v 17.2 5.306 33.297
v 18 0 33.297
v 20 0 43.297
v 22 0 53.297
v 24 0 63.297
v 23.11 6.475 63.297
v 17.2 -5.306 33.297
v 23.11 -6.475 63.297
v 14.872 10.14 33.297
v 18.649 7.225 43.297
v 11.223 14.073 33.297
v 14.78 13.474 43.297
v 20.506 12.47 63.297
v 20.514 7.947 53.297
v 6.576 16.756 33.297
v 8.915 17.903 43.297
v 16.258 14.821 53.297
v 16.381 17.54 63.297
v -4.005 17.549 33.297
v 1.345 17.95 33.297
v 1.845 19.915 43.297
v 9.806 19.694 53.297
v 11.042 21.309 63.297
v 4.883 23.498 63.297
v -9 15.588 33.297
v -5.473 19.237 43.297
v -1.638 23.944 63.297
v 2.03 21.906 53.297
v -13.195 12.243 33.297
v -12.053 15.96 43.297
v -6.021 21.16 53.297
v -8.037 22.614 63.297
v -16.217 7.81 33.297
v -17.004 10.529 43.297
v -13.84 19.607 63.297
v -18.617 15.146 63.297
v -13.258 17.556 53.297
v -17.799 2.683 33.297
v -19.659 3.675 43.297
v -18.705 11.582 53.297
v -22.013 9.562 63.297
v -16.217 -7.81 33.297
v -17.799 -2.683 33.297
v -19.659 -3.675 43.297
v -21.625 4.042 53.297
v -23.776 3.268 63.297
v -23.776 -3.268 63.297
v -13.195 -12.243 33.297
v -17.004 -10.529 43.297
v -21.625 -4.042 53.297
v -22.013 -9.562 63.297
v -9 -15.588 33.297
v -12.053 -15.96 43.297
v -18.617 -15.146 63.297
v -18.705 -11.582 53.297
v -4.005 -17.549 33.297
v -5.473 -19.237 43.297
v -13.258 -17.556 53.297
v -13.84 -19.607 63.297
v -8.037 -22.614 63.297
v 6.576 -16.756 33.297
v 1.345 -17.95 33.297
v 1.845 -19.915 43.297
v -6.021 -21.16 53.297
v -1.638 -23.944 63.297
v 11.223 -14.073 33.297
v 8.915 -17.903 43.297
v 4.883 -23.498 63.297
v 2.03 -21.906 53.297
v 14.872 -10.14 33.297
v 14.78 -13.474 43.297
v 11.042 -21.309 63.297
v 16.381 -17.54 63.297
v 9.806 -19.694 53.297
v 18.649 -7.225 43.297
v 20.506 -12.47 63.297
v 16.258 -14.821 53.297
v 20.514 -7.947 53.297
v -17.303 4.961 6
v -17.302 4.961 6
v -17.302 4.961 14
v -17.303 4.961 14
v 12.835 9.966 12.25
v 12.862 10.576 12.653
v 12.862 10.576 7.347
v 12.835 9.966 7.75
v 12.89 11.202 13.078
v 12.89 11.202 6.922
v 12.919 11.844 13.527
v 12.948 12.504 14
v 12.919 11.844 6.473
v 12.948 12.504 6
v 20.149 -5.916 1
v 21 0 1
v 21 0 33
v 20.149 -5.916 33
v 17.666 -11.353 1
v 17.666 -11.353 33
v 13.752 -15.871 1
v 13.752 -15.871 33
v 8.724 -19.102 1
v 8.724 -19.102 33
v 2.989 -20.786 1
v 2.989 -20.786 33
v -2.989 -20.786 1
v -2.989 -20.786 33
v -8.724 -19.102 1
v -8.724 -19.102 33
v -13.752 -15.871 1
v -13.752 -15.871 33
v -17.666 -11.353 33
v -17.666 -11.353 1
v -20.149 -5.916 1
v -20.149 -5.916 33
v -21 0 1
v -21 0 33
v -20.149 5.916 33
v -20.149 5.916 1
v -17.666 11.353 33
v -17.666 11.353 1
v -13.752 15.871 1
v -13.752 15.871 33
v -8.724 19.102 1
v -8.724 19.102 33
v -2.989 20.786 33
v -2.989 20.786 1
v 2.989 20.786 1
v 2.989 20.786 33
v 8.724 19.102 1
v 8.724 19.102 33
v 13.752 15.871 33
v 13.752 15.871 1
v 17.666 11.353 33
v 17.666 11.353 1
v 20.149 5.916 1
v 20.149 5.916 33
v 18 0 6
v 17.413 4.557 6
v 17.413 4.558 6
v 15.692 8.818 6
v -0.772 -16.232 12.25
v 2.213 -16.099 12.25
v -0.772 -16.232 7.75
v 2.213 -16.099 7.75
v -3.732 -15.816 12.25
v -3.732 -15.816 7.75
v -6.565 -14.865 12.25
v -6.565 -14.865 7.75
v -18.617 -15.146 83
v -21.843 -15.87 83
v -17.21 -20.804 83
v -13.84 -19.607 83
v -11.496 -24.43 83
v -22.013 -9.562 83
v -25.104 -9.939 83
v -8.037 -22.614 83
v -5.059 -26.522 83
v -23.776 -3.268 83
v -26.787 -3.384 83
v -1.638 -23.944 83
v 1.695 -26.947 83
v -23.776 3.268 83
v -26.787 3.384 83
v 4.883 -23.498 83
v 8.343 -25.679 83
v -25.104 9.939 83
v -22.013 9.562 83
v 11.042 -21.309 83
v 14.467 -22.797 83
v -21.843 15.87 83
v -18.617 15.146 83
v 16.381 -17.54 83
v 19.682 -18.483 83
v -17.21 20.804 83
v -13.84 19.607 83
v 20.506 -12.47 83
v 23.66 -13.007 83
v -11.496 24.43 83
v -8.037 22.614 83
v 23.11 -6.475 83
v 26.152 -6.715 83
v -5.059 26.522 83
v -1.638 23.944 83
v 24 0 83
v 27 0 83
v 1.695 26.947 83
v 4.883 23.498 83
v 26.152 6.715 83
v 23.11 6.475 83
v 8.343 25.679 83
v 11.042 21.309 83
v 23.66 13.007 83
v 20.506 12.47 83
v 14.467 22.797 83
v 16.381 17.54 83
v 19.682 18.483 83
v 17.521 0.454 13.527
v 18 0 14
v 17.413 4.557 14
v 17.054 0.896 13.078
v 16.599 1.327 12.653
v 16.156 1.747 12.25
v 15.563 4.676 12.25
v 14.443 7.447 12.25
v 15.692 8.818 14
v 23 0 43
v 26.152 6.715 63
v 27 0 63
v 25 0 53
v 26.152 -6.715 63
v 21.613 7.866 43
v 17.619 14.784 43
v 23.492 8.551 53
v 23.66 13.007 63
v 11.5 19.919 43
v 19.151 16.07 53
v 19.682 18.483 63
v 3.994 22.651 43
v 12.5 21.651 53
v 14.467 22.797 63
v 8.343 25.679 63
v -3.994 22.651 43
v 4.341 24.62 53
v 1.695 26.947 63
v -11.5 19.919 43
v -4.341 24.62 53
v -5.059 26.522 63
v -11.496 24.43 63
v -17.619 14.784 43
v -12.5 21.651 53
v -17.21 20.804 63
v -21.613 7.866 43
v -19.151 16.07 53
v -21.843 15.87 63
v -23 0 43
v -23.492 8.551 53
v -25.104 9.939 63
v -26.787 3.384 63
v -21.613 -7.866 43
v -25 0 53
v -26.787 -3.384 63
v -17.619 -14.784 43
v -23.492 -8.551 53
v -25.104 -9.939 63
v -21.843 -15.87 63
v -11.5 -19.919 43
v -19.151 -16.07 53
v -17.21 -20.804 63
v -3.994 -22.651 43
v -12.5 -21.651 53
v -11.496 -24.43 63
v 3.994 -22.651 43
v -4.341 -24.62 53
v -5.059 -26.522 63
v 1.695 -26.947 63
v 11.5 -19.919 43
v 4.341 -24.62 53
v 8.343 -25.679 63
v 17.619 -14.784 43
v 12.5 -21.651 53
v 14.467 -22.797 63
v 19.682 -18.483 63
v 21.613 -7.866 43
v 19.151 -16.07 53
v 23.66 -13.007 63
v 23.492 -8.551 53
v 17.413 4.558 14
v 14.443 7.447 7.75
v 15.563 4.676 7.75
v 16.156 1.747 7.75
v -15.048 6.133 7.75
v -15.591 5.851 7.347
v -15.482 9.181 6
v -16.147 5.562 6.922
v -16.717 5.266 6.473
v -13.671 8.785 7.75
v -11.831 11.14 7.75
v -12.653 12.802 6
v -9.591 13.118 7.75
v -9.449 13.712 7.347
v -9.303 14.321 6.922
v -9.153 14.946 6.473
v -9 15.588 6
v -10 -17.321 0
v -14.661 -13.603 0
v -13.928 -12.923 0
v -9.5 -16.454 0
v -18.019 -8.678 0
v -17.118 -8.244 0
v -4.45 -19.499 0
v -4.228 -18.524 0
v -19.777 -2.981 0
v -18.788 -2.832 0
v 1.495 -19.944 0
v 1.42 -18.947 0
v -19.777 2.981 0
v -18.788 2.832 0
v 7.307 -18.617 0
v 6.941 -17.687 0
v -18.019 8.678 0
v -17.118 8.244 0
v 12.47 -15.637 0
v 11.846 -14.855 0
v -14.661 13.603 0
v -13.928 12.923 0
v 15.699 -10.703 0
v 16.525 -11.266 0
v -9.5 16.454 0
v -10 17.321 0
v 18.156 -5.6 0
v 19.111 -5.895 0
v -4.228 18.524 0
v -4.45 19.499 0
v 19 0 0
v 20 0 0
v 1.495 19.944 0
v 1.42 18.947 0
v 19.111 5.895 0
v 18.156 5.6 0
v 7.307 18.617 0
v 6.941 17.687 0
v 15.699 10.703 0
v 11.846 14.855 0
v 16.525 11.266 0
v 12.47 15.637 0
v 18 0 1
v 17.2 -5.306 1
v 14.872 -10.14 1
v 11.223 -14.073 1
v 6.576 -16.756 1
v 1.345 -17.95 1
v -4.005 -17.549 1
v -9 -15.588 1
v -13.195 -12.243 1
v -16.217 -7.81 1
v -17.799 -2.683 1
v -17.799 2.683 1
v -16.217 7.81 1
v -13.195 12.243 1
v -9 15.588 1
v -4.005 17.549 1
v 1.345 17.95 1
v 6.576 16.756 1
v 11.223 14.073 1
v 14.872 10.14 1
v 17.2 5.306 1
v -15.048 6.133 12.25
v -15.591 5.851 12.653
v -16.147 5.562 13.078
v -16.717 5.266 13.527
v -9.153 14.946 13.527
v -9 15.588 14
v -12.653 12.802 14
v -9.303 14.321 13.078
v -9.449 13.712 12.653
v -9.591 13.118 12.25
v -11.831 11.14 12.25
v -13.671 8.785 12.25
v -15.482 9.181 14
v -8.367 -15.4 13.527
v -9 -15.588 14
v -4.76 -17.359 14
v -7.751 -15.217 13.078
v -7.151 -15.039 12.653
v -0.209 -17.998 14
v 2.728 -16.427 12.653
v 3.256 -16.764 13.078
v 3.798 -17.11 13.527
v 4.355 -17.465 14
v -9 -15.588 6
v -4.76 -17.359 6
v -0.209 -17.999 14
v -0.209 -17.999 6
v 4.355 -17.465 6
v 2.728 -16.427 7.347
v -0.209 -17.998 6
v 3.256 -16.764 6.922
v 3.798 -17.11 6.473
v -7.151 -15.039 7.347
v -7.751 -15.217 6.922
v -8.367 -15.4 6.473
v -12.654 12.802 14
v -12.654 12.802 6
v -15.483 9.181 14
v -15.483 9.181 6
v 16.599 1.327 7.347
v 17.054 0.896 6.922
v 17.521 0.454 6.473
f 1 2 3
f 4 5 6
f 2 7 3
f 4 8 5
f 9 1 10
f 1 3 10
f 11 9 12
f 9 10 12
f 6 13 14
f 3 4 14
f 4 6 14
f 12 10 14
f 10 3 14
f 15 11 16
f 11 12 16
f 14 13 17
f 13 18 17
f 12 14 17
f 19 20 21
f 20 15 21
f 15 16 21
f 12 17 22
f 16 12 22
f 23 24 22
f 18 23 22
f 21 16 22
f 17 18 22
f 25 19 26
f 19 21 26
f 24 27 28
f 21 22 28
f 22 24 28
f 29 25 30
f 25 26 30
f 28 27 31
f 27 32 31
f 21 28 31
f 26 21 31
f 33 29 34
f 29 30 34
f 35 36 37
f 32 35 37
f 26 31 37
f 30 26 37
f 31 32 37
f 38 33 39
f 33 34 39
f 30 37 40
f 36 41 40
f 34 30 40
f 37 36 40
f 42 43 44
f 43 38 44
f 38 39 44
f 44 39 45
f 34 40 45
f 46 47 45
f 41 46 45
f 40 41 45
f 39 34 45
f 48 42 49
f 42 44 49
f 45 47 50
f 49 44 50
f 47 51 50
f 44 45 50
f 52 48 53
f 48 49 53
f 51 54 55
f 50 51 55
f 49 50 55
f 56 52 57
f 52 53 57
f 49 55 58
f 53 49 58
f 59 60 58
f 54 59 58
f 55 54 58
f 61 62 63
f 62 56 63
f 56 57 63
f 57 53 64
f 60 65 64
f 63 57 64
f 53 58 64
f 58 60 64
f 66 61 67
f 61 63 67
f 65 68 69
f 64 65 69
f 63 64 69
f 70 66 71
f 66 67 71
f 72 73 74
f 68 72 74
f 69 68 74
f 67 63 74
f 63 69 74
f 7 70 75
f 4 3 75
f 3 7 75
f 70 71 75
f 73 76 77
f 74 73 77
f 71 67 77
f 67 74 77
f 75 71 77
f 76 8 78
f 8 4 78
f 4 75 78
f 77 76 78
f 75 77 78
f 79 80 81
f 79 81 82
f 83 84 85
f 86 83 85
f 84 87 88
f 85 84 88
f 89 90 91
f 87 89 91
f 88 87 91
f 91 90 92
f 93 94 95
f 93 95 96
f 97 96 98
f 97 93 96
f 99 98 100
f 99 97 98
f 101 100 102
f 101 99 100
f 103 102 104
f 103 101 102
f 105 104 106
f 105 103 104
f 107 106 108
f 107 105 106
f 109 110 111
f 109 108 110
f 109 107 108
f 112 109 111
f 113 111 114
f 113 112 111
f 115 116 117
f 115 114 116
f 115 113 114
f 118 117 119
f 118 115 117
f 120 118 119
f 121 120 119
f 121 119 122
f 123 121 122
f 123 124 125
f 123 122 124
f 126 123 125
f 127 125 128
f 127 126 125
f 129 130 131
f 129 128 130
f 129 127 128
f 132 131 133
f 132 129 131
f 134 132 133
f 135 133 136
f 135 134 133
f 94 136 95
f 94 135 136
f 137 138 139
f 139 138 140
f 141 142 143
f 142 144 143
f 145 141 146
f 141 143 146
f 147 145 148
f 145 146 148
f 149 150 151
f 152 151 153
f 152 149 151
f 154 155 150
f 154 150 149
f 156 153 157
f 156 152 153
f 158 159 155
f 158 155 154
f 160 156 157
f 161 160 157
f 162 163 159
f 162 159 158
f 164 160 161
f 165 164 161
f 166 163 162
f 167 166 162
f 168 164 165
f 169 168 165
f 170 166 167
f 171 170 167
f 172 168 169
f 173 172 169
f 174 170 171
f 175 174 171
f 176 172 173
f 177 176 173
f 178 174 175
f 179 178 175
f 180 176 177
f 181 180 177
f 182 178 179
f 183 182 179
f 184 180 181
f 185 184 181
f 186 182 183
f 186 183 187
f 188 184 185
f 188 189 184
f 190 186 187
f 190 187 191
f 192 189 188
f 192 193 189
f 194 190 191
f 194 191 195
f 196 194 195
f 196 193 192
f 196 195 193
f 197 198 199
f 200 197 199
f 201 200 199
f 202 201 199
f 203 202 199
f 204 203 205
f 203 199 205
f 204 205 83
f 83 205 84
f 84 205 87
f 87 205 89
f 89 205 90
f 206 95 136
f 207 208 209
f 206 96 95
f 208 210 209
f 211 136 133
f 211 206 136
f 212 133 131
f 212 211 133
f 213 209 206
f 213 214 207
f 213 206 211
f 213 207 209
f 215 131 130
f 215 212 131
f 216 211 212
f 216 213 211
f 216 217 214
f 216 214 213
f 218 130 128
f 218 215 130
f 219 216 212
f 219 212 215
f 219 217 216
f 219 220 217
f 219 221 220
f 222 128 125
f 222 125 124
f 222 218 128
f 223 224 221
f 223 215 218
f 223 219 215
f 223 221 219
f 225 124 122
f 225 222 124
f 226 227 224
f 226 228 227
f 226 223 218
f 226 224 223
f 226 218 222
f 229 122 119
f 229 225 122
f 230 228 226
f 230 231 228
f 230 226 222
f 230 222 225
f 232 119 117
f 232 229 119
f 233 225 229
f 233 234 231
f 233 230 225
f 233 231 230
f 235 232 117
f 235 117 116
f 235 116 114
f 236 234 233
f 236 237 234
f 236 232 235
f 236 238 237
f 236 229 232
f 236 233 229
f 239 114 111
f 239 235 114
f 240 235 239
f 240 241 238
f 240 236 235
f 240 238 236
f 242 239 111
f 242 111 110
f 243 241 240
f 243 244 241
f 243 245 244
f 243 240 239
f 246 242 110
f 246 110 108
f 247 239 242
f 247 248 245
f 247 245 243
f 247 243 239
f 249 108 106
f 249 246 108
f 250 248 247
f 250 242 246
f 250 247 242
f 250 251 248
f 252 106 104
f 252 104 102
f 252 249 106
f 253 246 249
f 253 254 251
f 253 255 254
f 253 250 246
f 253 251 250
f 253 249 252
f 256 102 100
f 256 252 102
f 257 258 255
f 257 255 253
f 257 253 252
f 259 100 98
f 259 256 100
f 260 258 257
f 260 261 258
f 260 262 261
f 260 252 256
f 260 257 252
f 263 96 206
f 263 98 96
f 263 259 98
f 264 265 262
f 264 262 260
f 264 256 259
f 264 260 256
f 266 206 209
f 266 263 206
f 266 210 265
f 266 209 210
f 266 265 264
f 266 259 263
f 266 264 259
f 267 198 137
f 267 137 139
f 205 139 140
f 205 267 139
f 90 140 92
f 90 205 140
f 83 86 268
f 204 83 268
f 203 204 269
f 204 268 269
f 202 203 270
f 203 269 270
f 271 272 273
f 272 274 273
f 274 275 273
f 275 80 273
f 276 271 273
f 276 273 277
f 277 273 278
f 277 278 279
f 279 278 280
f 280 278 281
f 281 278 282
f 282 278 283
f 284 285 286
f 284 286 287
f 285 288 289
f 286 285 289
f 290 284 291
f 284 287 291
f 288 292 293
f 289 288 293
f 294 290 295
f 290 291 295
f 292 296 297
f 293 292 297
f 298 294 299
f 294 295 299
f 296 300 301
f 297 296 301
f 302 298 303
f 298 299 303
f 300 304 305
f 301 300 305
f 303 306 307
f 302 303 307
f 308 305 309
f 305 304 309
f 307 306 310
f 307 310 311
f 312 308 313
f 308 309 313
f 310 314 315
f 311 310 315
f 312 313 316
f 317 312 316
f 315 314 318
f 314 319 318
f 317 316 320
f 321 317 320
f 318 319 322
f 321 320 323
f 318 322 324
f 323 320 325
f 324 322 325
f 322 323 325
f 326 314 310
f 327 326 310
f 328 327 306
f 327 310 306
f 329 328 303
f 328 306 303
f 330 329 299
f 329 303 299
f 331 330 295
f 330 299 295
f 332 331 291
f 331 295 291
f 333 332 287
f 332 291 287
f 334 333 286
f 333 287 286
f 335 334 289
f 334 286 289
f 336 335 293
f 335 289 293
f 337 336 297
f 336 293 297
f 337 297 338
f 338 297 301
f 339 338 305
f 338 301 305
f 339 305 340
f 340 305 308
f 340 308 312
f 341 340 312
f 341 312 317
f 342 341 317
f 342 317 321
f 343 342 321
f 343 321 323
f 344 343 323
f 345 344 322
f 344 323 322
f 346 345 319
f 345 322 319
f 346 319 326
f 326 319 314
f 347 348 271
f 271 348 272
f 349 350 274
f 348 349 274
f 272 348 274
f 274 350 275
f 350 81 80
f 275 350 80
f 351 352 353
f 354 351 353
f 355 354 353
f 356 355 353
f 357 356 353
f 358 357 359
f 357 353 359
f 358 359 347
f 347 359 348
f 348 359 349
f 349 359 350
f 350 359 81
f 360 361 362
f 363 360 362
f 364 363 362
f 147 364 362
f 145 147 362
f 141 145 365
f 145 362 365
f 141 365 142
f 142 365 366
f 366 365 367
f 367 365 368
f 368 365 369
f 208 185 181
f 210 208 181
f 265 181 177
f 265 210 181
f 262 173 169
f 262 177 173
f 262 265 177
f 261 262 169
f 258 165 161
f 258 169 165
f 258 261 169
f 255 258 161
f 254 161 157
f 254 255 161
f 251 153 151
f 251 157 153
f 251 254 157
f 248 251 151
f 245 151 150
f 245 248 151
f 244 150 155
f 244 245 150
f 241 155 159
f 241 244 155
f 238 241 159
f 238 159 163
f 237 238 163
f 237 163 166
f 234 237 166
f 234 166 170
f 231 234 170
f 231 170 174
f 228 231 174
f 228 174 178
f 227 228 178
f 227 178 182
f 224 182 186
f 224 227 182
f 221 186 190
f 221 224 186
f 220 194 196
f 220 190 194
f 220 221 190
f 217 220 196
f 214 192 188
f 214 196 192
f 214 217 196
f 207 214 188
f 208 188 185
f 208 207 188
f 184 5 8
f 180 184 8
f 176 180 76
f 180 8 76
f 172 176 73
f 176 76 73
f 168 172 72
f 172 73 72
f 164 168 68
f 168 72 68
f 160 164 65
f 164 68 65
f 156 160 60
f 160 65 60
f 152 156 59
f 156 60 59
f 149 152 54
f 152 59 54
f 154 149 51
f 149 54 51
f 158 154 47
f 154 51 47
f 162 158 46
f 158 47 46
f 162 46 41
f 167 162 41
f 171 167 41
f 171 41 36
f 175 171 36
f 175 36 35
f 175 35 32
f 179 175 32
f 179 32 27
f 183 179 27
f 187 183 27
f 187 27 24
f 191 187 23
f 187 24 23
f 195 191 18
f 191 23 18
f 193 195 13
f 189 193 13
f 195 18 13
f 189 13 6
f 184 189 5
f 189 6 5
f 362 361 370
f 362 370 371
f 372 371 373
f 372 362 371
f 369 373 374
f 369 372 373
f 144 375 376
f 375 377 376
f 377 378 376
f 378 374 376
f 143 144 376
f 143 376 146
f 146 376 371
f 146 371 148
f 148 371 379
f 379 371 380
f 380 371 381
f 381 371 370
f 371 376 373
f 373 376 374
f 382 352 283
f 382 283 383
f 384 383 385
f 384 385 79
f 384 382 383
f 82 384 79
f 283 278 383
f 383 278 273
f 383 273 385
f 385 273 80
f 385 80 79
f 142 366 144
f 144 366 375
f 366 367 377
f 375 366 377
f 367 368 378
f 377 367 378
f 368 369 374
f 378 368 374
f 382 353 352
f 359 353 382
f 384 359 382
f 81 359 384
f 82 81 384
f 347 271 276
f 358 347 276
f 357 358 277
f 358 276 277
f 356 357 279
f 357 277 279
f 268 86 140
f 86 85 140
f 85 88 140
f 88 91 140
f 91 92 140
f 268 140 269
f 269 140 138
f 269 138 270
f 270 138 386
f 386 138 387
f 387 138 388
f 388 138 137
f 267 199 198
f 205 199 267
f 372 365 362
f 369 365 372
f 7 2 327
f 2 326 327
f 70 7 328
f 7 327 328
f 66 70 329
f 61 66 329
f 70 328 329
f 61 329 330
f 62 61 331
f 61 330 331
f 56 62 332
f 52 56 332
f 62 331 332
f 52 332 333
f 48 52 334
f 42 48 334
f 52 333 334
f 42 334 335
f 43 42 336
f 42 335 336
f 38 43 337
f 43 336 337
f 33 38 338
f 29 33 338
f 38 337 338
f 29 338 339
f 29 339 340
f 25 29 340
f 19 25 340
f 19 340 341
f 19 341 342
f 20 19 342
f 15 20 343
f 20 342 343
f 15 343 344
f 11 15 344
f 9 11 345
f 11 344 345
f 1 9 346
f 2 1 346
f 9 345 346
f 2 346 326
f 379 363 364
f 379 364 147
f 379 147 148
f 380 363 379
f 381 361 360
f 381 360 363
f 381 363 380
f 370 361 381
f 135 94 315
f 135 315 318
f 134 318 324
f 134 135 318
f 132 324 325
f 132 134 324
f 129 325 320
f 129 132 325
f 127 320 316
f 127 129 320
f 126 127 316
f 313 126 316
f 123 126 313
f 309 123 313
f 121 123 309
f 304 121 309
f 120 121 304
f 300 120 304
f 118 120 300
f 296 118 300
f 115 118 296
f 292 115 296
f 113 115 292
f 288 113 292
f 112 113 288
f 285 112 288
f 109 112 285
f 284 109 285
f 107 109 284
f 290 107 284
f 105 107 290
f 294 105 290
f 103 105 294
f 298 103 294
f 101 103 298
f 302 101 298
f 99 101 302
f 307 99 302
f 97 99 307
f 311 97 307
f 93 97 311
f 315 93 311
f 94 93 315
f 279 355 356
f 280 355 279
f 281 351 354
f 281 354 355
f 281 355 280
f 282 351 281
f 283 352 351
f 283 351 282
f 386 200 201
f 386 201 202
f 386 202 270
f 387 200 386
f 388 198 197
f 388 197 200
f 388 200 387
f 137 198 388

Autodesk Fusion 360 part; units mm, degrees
sketch "adapter_side" plane through (0, 0, 0) normal (0, 0, 1) x (1, 0, 0)
  circle A0 centre (0, 0) radius 21
  dimension "d33" = 42
extrude "Extrude2" add sketch "adapter_side" along normal blind 33 makes body 1
ref_plane "WorkPlane2" through (0, 0, 63) normal (0, 0, 1) x (1, 0, 0)
sketch "bandsaw_side" plane through (0, 0, 63) normal (0, 0, 1) x (1, 0, 0)
  circle A0 centre (0, 0) radius 27
  dimension "d38" = 54
extrude "Extrude3" add sketch "bandsaw_side" along normal blind 20 separate body makes body 2
loft "Loft3" add section 1 face at (-5.9246, 2.0633, 33) section 2 face at (4.9388, -0.7444, 63) on bodies 1 2 bodies 1 2
shell "Shell1" thickness 3 removed faces 2 at (-5.9246, 2.0633, 0) at (4.9388, -0.7444, 83) on bodies 1
sketch "pins" plane through (0, 0, 0) normal (0, 1, 0) x (1, 0, 0)
  line L0 (18, 0) -> (18, -33.2971)
  line L1 (-18, -33.2971) -> (-18, 0)
  line L2 (18, -14) -> (16.25, -14)
  line L3 (16.25, -14) -> (16.25, -6)
  line L4 (16.25, -6) -> (18, -6)
  line L5 (18, -6) -> (18, -14)
  dimension "d42" = 1.75
  dimension "d43" = 8
  dimension "d44" = 6
revolve "Revolve3" add sketch "pins" angle 44 about axis through (0, 0, 1.75) along (0, 0, 1) separate body makes body 3
chamfer "Chamfer2" distance 1.75 angle 45 4 edges at (15.0667, 6.0874, 14) (16.25, 0, 10) (15.0667, 6.0874, 6) (11.6893, 11.2882, 10) on bodies 3
pattern_circular "C-Pattern2" count 3 over 360 about axis through (0, 0, 1.75) along (0, 0, 1) of bodies 3 makes body 4 at (-16.2088, 7.8279, 8.6667) makes body 5 at (-5.4959, -17.1405, 8.6667)
chamfer "Chamfer3" distance 1 angle 45 2 edges at (-19.5789, -7.5939, 0) (-16.7819, -6.5091, 0) on bodies 1
equation "d_adapter_inside = 36 mm" comment "inner diameter of adapter"
equation "t = 3 mm" comment "Thikness of adapter wall"
equation "t_pin = 1.75 mm" comment "Thickness of pins"
equation "l_pin = 8 mm"
equation "s_bottom_pin = 6 mm" comment "space from bottom to pin"
equation "s_top_pin = 19 mm" comment "space from top to pin"
equation "chamfer_bottom = 1 mm" comment "chamfer at bottom of adapter"
equation "l_adapter = s_bottom_pin + l_pin + s_top_pin"
equation "a_pin = 44 deg" comment "Angle of pin"
equation "d_bandsaw_inside = 54 mm"
equation "l_bandsaw = 20 mm"
equation "d33 = d_adapter_inside + 2 * t"
equation "d34 = l_adapter"
equation "l_adapter_to_bandsaw = 30 mm"
equation "d37 = l_adapter_to_bandsaw"
equation "d38 = d_bandsaw_inside"
equation "d39 = l_bandsaw"
equation "d42 = t_pin"
equation "d43 = l_pin"
equation "d44 = s_bottom_pin"
equation "d45 = a_pin"
equation "d46 = chamfer_pin"
equation "d49 = chamfer_bottom"
equation "chamfer_pin = t_pin"
